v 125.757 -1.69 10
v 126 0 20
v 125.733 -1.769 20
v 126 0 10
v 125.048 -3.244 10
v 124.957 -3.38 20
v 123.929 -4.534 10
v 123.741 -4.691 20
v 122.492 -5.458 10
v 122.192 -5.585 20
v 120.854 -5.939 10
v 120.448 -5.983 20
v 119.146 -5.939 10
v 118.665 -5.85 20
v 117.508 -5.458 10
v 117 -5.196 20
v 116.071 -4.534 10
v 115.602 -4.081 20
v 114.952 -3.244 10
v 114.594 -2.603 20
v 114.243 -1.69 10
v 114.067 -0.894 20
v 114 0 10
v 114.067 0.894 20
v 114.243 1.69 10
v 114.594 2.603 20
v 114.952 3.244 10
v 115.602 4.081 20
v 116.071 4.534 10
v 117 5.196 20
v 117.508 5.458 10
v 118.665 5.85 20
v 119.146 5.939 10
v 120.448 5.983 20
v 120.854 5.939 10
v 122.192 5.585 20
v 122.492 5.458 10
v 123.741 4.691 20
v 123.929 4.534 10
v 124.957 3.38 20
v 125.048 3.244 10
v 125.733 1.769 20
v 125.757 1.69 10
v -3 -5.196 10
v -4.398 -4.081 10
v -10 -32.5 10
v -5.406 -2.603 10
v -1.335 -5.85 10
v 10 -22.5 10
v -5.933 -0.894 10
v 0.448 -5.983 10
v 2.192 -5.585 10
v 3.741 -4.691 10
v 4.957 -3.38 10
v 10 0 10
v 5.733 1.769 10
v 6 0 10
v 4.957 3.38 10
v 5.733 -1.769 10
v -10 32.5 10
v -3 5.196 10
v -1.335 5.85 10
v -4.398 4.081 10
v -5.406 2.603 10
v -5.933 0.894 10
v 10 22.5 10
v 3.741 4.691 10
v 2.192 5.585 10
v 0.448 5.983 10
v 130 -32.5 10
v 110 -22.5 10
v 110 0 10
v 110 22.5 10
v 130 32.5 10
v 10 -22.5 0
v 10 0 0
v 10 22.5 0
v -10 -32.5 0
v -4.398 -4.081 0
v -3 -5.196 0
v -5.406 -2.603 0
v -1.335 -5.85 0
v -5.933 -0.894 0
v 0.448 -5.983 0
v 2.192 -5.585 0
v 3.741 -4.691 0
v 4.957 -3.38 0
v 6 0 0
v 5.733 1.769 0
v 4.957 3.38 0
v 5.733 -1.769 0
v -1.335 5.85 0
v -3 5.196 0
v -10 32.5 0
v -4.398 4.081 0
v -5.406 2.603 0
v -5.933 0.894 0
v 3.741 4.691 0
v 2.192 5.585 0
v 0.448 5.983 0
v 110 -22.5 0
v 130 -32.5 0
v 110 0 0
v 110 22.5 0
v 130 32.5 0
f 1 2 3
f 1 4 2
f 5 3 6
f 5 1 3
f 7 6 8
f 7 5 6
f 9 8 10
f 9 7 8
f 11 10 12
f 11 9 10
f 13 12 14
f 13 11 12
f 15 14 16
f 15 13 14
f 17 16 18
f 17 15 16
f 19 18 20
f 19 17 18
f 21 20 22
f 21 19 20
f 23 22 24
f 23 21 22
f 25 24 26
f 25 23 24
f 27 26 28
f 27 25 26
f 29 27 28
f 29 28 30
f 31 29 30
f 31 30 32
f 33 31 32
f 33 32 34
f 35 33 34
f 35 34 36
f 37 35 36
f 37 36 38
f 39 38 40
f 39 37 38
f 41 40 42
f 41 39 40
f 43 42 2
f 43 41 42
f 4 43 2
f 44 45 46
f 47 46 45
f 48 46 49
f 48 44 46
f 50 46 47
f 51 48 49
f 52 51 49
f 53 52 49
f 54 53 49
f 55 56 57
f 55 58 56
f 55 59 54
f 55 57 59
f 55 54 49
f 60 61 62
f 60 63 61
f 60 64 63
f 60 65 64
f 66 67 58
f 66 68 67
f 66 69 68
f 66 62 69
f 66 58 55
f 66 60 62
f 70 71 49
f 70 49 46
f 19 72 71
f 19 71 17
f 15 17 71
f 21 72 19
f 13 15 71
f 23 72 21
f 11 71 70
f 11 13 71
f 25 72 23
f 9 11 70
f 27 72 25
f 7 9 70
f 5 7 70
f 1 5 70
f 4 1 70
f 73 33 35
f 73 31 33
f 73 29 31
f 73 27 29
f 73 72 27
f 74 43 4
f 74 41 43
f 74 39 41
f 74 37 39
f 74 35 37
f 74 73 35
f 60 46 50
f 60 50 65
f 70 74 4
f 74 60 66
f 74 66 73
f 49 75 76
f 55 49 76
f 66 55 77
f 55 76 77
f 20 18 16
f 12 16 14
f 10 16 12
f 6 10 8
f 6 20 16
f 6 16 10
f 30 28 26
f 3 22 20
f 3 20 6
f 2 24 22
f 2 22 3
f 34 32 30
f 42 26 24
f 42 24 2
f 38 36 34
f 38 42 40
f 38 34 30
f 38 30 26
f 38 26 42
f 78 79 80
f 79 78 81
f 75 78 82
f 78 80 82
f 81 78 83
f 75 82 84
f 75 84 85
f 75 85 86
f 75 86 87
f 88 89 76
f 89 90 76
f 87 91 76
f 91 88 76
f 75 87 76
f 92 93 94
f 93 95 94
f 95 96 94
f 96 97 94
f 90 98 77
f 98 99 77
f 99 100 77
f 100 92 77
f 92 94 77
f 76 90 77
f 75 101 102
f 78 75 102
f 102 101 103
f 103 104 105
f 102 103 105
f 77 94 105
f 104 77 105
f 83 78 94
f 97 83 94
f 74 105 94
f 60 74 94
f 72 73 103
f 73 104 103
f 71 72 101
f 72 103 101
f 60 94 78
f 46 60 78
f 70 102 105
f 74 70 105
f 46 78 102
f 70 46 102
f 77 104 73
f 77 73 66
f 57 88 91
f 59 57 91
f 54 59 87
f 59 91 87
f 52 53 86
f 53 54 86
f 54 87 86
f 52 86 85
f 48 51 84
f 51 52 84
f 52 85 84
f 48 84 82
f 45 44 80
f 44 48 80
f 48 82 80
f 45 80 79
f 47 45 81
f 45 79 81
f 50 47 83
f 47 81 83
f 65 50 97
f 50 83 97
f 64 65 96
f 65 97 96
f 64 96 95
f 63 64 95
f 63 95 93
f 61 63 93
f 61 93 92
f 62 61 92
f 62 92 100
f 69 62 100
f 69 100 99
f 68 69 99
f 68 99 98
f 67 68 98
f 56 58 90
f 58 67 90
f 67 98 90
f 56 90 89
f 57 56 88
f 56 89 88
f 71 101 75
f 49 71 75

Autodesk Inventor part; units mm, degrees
ref_plane "YZ Plane" through (0, 0, 0) normal (1, 0, 0) x (0, 1, 0)
ref_plane "XZ Plane" through (0, 0, 0) normal (0, 1, 0) x (-1, 0, 0)
ref_plane "XY Plane" through (0, 0, 0) normal (0, 0, 1) x (1, 0, 0)
sketch "Boceto1" plane through (0, 0, 0) normal (0, 0, 1) x (1, 0, 0)
  circle A0 centre (0, 0) radius 6
  line L0 (-10, -32.5) -> (10, -32.5)
  line L1 (10, -32.5) -> (10, 32.5)
  line L2 (10, 32.5) -> (-10, 32.5)
  line L3 (-10, 32.5) -> (-10, -32.5)
  line L4 (-10, -32.5) -> (10, 32.5) construction
  line L5 (10, -32.5) -> (-10, 32.5) construction
  line L6 (0, 0) -> (84.0619, 0)
  line L7 (0, 0) -> (120, 0)
  circle A1 centre (120, 0) radius 6
  line L8 (110, -32.5) -> (130, -32.5)
  line L9 (130, -32.5) -> (130, 32.5)
  line L10 (130, 32.5) -> (110, 32.5)
  line L11 (110, 32.5) -> (110, -32.5)
  line L12 (110, -32.5) -> (130, 32.5) construction
  line L13 (130, -32.5) -> (110, 32.5) construction
  line L14 (10, -32.5) -> (110, -32.5)
  line L15 (110, -32.5) -> (110, -22.5)
  line L16 (110, -22.5) -> (10, -22.5)
  line L17 (110, 32.5) -> (110, 22.5)
  line L18 (110, 22.5) -> (10, 22.5)
  line L19 (10, 32.5) -> (110, 32.5)
  dimension "d0" = 12
  dimension "d1" = 120
  dimension "d2" = 65
  dimension "d3" = 20
  dimension "d4" = 20
  dimension "d5" = 65
  dimension "d6" = 10
  dimension "d7" = 10
extrude "Extrusión1" add sketch "Boceto1" along normal blind 10 contours L1 L0 L3 L2 | L16 L11 L14 L1 | L1 L19 L11 L18 | A1 | L11 L10 L9 L8
sketch "Boceto2" plane through (0, 0, 10) normal (0, 0, 1) x (1, 0, 0)
  circle A0 centre (0, 0) radius 6 projected
  line L0 (0, 0) -> (120, 0)
  circle A1 centre (120, 0) radius 6
  dimension "d10" = 120
  dimension "d11" = 12
extrude "Extrusión2" add sketch "Boceto2" along normal blind 10 contours A1
properties part number "Eslabon_1_inventor"
